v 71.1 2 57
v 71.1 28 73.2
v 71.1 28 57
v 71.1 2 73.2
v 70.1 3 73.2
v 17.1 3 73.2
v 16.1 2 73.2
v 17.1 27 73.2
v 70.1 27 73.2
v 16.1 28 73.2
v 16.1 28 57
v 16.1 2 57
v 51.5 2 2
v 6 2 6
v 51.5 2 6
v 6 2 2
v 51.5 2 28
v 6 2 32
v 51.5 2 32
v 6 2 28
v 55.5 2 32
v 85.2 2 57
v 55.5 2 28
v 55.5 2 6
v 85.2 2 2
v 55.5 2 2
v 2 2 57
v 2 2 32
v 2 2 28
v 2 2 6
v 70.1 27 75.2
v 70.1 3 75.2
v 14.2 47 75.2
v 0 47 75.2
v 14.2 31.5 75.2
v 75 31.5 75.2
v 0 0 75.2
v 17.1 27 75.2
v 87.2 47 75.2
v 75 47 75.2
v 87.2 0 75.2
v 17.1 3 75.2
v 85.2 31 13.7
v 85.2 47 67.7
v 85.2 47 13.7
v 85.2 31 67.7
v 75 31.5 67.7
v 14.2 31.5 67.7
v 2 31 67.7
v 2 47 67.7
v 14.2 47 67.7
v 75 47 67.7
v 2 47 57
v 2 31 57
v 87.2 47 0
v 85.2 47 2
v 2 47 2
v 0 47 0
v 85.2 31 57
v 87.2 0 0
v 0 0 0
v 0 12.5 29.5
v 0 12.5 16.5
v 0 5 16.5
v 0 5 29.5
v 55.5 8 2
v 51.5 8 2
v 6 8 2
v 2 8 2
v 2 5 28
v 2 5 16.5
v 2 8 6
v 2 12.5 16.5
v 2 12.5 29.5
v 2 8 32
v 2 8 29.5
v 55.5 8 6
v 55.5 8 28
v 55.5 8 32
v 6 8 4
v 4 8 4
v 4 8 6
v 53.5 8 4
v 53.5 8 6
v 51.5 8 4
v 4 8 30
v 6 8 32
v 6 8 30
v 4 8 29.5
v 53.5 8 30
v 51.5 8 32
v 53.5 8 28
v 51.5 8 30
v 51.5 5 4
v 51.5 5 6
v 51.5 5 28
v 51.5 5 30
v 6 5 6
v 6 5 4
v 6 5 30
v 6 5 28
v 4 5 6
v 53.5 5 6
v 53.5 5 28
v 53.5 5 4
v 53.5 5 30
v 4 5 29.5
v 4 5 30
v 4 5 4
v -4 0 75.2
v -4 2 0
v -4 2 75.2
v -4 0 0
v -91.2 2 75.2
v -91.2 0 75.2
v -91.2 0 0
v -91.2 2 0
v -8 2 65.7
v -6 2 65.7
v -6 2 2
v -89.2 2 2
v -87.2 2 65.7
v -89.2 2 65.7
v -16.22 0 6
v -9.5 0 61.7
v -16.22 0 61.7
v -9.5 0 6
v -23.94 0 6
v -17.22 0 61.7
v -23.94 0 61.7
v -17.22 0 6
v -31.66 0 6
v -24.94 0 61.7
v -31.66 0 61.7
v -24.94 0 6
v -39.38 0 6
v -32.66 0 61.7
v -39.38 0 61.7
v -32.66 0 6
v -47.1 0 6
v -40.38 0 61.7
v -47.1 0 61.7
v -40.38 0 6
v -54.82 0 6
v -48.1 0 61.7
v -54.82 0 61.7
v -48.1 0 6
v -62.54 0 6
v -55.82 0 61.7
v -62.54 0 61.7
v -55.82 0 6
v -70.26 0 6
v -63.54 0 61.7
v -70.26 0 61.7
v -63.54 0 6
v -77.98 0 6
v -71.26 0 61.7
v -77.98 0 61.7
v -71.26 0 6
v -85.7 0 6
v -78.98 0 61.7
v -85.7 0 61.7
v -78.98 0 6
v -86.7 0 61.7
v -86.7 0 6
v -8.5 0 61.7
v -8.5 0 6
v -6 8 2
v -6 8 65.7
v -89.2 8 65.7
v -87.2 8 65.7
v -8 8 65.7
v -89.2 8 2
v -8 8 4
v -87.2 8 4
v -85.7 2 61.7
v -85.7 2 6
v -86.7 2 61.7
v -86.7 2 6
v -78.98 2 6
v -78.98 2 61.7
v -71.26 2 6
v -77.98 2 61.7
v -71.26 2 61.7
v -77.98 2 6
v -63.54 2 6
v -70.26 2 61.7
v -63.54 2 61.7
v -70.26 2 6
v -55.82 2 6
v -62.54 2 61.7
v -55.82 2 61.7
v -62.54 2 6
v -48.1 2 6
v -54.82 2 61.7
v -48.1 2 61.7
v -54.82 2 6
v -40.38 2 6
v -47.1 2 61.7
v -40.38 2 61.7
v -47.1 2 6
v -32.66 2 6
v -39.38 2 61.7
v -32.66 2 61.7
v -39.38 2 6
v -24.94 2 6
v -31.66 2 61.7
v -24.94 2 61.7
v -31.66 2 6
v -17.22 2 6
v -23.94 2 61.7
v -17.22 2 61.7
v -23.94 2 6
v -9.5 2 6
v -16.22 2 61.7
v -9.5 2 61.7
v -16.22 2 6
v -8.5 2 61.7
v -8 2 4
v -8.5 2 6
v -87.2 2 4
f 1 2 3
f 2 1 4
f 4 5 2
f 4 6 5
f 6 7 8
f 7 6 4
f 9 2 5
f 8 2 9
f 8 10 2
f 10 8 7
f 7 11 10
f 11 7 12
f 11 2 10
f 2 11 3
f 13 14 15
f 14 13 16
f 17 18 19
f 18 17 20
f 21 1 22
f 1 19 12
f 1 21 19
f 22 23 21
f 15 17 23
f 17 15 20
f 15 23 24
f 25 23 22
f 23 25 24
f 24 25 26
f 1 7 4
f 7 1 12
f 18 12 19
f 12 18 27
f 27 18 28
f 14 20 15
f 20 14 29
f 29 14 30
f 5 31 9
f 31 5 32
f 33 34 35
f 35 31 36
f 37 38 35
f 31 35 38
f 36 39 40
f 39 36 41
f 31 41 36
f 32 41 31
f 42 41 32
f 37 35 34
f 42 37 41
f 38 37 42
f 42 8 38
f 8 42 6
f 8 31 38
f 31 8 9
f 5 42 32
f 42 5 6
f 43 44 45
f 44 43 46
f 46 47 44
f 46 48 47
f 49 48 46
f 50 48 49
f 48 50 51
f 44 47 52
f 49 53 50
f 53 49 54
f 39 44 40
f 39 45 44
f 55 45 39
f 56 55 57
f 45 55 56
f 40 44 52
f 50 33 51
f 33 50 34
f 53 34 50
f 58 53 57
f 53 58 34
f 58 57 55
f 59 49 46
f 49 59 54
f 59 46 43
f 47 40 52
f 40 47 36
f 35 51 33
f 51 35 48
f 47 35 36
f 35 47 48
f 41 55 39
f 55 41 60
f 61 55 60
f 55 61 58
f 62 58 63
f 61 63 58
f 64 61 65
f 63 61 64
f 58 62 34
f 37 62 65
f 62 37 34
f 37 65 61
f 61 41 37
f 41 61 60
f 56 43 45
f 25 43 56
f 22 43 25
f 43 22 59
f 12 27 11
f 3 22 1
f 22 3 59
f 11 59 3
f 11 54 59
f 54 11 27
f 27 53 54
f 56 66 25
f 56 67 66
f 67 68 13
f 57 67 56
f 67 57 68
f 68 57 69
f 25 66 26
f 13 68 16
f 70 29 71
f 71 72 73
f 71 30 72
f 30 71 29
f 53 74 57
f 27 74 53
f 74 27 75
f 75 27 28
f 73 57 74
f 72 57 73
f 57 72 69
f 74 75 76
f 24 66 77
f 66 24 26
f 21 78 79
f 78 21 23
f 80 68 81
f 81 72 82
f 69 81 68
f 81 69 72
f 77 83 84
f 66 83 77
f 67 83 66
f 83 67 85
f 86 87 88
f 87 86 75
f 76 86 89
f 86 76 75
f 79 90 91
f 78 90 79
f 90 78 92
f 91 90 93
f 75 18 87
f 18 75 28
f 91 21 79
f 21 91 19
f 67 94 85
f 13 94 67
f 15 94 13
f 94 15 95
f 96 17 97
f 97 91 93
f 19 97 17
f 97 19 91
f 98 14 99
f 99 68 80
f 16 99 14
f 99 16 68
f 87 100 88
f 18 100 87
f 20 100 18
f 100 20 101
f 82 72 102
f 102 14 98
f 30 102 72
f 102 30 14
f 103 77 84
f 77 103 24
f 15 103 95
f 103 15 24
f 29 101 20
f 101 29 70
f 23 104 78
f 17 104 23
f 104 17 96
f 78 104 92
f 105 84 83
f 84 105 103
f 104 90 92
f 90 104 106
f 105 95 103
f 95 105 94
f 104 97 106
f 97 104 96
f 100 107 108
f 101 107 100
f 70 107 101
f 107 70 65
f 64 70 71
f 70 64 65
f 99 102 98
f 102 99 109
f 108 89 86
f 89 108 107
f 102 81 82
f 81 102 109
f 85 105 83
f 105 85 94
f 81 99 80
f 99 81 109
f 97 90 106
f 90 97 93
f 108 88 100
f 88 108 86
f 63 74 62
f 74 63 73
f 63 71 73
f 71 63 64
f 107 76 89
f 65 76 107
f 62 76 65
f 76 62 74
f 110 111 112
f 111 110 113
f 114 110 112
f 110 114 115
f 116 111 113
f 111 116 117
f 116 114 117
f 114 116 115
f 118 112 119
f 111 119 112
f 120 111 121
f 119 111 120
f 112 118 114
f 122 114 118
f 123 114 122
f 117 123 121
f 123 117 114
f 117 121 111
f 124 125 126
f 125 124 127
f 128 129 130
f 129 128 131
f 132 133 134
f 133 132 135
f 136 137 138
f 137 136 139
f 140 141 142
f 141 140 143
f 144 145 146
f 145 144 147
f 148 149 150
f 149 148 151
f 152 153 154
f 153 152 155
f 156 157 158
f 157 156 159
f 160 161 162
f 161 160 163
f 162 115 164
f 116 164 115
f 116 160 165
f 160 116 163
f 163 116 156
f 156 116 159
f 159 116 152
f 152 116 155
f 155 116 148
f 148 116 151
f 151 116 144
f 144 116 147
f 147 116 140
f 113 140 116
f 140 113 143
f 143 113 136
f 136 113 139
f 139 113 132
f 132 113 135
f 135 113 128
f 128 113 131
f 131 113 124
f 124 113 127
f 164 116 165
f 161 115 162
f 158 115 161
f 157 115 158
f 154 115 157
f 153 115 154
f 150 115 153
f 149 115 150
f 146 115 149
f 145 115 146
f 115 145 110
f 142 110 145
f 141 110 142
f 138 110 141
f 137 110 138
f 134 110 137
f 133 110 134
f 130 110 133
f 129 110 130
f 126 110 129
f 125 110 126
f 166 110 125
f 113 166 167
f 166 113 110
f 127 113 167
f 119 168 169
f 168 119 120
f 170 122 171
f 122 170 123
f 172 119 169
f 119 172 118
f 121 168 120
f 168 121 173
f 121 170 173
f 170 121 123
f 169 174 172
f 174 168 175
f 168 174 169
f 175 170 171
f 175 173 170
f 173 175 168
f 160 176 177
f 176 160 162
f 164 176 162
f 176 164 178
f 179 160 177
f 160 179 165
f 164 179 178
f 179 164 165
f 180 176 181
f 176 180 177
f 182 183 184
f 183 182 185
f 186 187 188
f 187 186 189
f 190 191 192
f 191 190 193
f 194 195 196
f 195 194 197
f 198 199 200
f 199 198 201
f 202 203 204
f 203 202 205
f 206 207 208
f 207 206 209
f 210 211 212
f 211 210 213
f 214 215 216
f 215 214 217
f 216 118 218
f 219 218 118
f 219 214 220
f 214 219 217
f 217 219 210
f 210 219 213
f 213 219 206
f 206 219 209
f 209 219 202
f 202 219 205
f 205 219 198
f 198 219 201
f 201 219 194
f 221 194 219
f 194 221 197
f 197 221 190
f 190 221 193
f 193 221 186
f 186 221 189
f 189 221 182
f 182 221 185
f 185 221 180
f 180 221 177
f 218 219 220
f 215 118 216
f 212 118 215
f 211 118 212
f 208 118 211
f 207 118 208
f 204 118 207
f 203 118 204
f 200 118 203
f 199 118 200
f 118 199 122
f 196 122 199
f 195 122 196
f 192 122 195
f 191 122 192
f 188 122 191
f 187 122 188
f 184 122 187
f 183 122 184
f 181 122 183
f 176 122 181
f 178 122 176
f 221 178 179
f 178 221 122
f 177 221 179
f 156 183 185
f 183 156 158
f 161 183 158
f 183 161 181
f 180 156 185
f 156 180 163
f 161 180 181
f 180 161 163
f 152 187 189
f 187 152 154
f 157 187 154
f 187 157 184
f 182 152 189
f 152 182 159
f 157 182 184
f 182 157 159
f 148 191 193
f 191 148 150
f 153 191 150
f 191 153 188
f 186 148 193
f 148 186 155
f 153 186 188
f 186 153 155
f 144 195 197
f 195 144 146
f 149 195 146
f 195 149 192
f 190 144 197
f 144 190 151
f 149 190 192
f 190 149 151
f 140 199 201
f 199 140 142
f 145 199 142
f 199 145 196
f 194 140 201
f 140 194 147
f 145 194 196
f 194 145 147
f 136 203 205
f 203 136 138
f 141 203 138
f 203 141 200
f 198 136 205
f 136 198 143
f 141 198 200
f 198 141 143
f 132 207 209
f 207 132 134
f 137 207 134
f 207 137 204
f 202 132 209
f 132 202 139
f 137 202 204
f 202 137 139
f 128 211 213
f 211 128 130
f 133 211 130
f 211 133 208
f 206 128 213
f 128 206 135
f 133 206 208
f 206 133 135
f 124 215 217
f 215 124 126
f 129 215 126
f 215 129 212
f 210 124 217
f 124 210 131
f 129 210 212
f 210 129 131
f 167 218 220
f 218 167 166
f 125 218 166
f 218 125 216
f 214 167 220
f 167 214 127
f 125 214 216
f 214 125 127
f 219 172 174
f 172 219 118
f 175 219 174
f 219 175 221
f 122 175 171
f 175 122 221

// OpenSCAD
// Sensor node containing a Sensirion SEN66, SPI 7segment display and probably some sort of ESP32
sen66 = [55, 26, 21.2];
display_pcb = [82.2, 15, 4];
digits = [60.8, 15, 7.5];
digits_offset = 12.2; // from left

depth_extra = 50;

wall = 2;   // wall width
fg = 1;     // buffer
border = 1; // for the sen66 cutout

esp_pcb = [49.5, 26, 2];
esp_usb = [7.5, 9, 3.5];
esp_usb_dy = 2.5;

module sen66(){
    union(){
        cube(sen66);
        translate([border, border, 0]) cube(sen66 + [-2*border, -2*border, wall]);
    }
}

module display(){
    union(){
        cube(display_pcb + [fg, fg, 0]);
        translate([digits_offset, fg/2, display_pcb.z]) cube(digits + [0, fg, 0]);
    }
}

module case(){
    difference(){
        union(){
            cube([display_pcb.x + 2*wall + fg, sen66.y + display_pcb.y + 2*wall + 2*fg, sen66.z + 2*wall + depth_extra]);
        }
        translate([display_pcb.x/2 + wall + fg/2 - sen66.x/2, wall, wall+depth_extra]) sen66();
        translate([(display_pcb.x+3*wall + fg)/2 - digits.x/2 - digits_offset, sen66.y + 2*wall + fg, sen66.z+2*wall+depth_extra - (digits.z+display_pcb.z)]) union() {
            display();
            translate([0, 0, -depth_extra]) cube(display_pcb + [fg, fg, depth_extra]);
        }
        translate([wall, wall, wall]) cube([display_pcb.x + fg, sen66.y + display_pcb.y + 2*wall + 2*fg, 2*wall + depth_extra + fg]);
    }
}

module wedge(){
    union(){
        cube([20, 20, 0.75]);
        cube([2, 20, 2.75]);
    }
}

module top(){
    difference(){
        union(){
            cube([display_pcb.x + 2*wall + fg, wall, sen66.z + 2*wall + depth_extra]);
            translate([wall, wall, wall]) cube([display_pcb.x + fg, 3*wall, sen66.z + depth_extra - digits.z]);
        }
        #translate([2*wall, wall, 2*wall]) cube([display_pcb.x + fg - 2*wall, 3*wall, sen66.z + depth_extra - wall - digits.z]);
        for (ix = [0:10]) {
            translate([2.25*wall + ix*(display_pcb.x + fg - 3*wall)/10, 0, 3*wall]) cube([wall/2, wall, sen66.z + depth_extra - 2*wall - digits.z - 2*wall]);
        }
    }

}

module esp(){
    difference(){
        cube(esp_pcb + [2*wall, 2*wall, 2*wall]);
        translate([2*wall, 0, 0]) cube(esp_pcb + [-2*wall, 2*wall, 2*wall]);
        translate([0, 2*wall, 0]) cube(esp_pcb + [2*wall, -2*wall, 2*wall]);
        translate([wall, wall, esp_pcb.z+wall/2]) cube(esp_pcb + [0, 0, 2*wall]);
    }
}

module espusb(){ // negative volume
    translate([wall, wall+esp_usb_dy, esp_pcb.z+wall/2]){
        translate([0, 0, 0]) cube(esp_usb + [0, 0, wall]);
        translate([-2*wall, -wall, -wall]) cube([2*wall, esp_usb.y + 2*wall, esp_usb.z + 2*wall]);
    }
}

module caseesp(){
    difference(){
        union(){
            case();
            translate([wall, wall, esp_pcb.y + wall + 2*wall]) rotate([-90, 0, 0]) esp();
        }

        translate([wall, esp_pcb.z + wall, esp_pcb.y + wall + 2*wall]) rotate([-90, 0, 0]) espusb();
    }
}

caseesp();

translate([-(display_pcb.x + 2*wall + fg + 2*wall), 0, 0]) top();
